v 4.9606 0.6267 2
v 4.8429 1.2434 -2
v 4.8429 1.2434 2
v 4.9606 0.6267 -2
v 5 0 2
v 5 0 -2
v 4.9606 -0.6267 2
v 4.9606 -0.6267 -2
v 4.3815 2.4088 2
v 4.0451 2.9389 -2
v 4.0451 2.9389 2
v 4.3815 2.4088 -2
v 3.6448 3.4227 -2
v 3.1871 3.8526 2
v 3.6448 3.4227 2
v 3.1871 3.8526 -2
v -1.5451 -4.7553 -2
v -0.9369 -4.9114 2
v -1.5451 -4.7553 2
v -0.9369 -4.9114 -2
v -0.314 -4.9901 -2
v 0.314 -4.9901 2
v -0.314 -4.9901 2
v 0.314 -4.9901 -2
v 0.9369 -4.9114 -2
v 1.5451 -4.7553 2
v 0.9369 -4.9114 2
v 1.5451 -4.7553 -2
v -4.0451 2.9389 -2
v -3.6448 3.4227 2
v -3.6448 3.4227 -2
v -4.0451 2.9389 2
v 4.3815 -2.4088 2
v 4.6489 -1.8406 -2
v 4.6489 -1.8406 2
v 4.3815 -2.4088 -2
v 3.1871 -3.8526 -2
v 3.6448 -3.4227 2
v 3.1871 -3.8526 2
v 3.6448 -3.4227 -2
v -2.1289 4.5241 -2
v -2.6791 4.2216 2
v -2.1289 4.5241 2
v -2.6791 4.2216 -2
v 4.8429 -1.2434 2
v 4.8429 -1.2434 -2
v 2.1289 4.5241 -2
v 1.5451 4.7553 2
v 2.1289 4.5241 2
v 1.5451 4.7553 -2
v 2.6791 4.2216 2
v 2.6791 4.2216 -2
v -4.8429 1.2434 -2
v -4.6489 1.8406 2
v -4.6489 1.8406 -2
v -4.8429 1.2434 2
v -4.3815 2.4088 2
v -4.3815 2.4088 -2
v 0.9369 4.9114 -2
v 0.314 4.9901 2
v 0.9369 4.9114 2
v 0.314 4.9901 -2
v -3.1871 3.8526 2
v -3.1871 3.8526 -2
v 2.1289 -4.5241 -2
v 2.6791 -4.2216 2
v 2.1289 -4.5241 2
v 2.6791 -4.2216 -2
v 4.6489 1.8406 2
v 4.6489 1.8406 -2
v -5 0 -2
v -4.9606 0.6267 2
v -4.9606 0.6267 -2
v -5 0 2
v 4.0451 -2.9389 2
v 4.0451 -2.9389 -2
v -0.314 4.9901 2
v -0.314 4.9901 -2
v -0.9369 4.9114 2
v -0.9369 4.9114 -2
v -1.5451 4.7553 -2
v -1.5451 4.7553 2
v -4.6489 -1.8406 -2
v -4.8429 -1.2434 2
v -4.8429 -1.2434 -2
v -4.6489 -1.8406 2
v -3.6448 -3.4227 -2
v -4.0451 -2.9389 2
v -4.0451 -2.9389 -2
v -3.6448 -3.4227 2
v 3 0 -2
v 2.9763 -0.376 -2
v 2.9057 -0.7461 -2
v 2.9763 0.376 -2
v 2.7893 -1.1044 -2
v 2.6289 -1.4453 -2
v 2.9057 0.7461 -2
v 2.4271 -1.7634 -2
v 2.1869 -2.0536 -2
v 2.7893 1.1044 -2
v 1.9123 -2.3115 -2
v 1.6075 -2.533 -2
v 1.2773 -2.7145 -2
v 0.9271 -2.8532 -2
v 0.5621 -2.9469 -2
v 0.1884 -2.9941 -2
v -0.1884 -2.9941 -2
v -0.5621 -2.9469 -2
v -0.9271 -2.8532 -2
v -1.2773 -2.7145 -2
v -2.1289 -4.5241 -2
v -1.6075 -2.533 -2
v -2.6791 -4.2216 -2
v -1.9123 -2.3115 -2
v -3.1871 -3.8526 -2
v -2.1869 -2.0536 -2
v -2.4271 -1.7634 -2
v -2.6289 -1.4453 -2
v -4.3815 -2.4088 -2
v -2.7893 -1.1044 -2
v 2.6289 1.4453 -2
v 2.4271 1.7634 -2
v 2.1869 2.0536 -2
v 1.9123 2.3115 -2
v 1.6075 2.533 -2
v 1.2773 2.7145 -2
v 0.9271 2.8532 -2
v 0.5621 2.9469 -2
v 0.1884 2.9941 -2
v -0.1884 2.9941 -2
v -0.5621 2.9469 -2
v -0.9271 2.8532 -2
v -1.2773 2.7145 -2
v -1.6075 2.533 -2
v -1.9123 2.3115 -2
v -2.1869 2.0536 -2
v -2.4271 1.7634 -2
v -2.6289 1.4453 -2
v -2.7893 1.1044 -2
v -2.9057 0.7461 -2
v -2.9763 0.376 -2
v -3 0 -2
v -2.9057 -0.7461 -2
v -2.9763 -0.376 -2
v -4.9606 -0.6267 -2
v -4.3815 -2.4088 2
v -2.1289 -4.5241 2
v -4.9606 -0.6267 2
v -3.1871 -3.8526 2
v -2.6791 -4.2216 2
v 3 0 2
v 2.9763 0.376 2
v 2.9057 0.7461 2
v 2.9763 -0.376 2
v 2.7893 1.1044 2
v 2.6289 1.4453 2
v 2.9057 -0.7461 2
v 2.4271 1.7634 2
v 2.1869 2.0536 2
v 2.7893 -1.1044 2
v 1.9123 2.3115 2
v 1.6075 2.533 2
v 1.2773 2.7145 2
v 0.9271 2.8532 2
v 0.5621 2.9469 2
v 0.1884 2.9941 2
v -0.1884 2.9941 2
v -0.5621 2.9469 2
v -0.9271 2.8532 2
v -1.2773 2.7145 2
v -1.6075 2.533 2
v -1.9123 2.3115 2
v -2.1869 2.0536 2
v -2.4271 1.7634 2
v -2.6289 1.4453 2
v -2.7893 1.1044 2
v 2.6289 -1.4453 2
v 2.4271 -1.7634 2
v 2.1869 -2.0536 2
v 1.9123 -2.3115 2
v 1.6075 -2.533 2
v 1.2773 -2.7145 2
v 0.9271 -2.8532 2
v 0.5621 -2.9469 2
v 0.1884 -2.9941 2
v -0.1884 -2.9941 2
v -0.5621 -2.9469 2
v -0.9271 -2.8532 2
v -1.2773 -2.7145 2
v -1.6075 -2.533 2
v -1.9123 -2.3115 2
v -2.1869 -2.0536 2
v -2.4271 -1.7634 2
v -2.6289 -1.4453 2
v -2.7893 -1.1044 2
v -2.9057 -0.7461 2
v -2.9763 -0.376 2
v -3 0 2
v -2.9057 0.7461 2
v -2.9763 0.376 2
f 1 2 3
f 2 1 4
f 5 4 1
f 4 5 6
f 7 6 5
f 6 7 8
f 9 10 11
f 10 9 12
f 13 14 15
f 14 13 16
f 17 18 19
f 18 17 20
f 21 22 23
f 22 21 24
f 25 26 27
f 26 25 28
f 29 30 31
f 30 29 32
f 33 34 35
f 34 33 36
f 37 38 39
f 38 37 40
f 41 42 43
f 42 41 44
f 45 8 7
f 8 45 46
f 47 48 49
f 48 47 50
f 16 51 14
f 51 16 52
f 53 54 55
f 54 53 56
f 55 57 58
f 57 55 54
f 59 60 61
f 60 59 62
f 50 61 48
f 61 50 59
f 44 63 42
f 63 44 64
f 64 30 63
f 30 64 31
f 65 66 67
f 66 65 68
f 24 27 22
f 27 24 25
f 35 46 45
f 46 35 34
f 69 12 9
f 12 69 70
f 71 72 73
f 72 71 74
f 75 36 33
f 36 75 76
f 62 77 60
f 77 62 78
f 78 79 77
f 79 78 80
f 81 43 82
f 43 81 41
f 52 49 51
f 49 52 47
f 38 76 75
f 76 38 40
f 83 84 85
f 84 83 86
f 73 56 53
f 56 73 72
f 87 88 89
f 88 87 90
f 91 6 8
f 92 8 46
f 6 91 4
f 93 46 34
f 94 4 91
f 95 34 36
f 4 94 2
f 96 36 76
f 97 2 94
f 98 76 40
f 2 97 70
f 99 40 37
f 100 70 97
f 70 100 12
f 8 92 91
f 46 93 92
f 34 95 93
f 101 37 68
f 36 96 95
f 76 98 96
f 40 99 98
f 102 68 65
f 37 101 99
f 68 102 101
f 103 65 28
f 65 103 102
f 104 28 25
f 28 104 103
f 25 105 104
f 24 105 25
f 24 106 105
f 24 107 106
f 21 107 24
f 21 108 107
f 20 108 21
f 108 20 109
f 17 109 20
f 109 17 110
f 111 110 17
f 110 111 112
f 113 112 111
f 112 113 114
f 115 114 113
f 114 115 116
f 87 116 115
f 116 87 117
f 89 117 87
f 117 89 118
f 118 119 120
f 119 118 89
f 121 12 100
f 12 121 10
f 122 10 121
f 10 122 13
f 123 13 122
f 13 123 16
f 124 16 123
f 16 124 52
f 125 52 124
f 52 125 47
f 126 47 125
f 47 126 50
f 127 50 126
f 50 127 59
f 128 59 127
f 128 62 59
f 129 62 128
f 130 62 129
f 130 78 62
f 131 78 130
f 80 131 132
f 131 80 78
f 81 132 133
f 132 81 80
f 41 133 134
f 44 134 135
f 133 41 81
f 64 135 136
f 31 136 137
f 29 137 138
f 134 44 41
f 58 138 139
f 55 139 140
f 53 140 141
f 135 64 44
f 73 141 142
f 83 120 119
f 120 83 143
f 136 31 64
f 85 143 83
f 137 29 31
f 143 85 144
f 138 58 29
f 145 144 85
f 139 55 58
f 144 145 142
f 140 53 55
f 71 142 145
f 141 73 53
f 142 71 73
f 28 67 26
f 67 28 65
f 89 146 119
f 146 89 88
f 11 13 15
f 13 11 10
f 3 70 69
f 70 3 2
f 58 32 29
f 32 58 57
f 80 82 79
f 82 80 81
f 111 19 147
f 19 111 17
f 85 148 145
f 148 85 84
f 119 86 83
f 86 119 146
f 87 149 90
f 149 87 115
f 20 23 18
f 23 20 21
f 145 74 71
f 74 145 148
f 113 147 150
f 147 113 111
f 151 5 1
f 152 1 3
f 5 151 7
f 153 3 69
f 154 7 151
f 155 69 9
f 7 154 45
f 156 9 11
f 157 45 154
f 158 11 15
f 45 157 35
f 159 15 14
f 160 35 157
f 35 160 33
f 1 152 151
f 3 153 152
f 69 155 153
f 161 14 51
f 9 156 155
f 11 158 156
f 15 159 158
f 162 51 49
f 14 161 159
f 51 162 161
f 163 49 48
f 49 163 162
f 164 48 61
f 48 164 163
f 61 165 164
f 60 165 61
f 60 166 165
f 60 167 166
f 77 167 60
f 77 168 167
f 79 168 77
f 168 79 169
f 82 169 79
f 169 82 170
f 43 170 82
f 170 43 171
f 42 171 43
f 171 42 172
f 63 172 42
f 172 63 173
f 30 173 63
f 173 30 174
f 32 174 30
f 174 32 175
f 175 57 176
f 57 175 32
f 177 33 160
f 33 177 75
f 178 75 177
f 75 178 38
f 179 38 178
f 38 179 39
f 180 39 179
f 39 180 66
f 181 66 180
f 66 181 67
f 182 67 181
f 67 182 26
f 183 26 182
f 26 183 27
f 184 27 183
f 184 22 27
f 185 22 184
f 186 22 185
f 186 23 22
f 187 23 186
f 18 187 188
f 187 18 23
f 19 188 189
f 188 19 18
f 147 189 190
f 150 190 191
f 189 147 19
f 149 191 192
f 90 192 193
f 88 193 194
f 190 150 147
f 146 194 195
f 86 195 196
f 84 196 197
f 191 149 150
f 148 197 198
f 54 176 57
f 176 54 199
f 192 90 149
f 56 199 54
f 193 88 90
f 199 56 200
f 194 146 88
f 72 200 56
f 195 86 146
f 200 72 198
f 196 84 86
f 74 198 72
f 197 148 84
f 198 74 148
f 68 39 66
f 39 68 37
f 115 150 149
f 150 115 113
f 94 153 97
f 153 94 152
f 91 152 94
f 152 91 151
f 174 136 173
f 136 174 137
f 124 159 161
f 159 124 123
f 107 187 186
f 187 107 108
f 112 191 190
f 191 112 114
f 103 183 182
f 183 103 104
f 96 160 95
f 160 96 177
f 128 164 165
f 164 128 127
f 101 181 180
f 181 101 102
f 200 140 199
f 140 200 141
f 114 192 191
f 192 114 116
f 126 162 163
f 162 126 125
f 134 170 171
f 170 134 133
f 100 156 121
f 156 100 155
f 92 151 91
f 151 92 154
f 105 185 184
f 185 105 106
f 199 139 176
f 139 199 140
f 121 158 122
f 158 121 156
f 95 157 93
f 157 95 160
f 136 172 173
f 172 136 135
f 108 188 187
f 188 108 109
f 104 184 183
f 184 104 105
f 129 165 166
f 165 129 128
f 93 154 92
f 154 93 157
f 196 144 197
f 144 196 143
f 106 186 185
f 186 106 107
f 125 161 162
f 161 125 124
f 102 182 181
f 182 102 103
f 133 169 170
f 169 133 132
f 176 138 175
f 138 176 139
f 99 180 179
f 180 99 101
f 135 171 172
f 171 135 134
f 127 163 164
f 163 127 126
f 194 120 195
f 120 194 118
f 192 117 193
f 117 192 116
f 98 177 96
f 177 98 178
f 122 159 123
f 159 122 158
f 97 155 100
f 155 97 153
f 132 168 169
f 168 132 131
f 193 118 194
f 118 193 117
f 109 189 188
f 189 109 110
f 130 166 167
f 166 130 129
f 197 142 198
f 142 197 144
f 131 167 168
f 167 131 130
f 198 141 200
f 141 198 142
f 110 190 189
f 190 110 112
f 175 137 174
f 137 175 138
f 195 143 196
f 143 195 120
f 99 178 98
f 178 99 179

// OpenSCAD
$fn = 50;


difference() {
	union() {
		translate(v = [0, 0, -2.0000000000]) {
			cylinder(h = 4, r = 5.0000000000);
		}
	}
	union() {
		translate(v = [0, 0, -100.0000000000]) {
			cylinder(h = 200, r = 3.0000000000);
		}
	}
}
